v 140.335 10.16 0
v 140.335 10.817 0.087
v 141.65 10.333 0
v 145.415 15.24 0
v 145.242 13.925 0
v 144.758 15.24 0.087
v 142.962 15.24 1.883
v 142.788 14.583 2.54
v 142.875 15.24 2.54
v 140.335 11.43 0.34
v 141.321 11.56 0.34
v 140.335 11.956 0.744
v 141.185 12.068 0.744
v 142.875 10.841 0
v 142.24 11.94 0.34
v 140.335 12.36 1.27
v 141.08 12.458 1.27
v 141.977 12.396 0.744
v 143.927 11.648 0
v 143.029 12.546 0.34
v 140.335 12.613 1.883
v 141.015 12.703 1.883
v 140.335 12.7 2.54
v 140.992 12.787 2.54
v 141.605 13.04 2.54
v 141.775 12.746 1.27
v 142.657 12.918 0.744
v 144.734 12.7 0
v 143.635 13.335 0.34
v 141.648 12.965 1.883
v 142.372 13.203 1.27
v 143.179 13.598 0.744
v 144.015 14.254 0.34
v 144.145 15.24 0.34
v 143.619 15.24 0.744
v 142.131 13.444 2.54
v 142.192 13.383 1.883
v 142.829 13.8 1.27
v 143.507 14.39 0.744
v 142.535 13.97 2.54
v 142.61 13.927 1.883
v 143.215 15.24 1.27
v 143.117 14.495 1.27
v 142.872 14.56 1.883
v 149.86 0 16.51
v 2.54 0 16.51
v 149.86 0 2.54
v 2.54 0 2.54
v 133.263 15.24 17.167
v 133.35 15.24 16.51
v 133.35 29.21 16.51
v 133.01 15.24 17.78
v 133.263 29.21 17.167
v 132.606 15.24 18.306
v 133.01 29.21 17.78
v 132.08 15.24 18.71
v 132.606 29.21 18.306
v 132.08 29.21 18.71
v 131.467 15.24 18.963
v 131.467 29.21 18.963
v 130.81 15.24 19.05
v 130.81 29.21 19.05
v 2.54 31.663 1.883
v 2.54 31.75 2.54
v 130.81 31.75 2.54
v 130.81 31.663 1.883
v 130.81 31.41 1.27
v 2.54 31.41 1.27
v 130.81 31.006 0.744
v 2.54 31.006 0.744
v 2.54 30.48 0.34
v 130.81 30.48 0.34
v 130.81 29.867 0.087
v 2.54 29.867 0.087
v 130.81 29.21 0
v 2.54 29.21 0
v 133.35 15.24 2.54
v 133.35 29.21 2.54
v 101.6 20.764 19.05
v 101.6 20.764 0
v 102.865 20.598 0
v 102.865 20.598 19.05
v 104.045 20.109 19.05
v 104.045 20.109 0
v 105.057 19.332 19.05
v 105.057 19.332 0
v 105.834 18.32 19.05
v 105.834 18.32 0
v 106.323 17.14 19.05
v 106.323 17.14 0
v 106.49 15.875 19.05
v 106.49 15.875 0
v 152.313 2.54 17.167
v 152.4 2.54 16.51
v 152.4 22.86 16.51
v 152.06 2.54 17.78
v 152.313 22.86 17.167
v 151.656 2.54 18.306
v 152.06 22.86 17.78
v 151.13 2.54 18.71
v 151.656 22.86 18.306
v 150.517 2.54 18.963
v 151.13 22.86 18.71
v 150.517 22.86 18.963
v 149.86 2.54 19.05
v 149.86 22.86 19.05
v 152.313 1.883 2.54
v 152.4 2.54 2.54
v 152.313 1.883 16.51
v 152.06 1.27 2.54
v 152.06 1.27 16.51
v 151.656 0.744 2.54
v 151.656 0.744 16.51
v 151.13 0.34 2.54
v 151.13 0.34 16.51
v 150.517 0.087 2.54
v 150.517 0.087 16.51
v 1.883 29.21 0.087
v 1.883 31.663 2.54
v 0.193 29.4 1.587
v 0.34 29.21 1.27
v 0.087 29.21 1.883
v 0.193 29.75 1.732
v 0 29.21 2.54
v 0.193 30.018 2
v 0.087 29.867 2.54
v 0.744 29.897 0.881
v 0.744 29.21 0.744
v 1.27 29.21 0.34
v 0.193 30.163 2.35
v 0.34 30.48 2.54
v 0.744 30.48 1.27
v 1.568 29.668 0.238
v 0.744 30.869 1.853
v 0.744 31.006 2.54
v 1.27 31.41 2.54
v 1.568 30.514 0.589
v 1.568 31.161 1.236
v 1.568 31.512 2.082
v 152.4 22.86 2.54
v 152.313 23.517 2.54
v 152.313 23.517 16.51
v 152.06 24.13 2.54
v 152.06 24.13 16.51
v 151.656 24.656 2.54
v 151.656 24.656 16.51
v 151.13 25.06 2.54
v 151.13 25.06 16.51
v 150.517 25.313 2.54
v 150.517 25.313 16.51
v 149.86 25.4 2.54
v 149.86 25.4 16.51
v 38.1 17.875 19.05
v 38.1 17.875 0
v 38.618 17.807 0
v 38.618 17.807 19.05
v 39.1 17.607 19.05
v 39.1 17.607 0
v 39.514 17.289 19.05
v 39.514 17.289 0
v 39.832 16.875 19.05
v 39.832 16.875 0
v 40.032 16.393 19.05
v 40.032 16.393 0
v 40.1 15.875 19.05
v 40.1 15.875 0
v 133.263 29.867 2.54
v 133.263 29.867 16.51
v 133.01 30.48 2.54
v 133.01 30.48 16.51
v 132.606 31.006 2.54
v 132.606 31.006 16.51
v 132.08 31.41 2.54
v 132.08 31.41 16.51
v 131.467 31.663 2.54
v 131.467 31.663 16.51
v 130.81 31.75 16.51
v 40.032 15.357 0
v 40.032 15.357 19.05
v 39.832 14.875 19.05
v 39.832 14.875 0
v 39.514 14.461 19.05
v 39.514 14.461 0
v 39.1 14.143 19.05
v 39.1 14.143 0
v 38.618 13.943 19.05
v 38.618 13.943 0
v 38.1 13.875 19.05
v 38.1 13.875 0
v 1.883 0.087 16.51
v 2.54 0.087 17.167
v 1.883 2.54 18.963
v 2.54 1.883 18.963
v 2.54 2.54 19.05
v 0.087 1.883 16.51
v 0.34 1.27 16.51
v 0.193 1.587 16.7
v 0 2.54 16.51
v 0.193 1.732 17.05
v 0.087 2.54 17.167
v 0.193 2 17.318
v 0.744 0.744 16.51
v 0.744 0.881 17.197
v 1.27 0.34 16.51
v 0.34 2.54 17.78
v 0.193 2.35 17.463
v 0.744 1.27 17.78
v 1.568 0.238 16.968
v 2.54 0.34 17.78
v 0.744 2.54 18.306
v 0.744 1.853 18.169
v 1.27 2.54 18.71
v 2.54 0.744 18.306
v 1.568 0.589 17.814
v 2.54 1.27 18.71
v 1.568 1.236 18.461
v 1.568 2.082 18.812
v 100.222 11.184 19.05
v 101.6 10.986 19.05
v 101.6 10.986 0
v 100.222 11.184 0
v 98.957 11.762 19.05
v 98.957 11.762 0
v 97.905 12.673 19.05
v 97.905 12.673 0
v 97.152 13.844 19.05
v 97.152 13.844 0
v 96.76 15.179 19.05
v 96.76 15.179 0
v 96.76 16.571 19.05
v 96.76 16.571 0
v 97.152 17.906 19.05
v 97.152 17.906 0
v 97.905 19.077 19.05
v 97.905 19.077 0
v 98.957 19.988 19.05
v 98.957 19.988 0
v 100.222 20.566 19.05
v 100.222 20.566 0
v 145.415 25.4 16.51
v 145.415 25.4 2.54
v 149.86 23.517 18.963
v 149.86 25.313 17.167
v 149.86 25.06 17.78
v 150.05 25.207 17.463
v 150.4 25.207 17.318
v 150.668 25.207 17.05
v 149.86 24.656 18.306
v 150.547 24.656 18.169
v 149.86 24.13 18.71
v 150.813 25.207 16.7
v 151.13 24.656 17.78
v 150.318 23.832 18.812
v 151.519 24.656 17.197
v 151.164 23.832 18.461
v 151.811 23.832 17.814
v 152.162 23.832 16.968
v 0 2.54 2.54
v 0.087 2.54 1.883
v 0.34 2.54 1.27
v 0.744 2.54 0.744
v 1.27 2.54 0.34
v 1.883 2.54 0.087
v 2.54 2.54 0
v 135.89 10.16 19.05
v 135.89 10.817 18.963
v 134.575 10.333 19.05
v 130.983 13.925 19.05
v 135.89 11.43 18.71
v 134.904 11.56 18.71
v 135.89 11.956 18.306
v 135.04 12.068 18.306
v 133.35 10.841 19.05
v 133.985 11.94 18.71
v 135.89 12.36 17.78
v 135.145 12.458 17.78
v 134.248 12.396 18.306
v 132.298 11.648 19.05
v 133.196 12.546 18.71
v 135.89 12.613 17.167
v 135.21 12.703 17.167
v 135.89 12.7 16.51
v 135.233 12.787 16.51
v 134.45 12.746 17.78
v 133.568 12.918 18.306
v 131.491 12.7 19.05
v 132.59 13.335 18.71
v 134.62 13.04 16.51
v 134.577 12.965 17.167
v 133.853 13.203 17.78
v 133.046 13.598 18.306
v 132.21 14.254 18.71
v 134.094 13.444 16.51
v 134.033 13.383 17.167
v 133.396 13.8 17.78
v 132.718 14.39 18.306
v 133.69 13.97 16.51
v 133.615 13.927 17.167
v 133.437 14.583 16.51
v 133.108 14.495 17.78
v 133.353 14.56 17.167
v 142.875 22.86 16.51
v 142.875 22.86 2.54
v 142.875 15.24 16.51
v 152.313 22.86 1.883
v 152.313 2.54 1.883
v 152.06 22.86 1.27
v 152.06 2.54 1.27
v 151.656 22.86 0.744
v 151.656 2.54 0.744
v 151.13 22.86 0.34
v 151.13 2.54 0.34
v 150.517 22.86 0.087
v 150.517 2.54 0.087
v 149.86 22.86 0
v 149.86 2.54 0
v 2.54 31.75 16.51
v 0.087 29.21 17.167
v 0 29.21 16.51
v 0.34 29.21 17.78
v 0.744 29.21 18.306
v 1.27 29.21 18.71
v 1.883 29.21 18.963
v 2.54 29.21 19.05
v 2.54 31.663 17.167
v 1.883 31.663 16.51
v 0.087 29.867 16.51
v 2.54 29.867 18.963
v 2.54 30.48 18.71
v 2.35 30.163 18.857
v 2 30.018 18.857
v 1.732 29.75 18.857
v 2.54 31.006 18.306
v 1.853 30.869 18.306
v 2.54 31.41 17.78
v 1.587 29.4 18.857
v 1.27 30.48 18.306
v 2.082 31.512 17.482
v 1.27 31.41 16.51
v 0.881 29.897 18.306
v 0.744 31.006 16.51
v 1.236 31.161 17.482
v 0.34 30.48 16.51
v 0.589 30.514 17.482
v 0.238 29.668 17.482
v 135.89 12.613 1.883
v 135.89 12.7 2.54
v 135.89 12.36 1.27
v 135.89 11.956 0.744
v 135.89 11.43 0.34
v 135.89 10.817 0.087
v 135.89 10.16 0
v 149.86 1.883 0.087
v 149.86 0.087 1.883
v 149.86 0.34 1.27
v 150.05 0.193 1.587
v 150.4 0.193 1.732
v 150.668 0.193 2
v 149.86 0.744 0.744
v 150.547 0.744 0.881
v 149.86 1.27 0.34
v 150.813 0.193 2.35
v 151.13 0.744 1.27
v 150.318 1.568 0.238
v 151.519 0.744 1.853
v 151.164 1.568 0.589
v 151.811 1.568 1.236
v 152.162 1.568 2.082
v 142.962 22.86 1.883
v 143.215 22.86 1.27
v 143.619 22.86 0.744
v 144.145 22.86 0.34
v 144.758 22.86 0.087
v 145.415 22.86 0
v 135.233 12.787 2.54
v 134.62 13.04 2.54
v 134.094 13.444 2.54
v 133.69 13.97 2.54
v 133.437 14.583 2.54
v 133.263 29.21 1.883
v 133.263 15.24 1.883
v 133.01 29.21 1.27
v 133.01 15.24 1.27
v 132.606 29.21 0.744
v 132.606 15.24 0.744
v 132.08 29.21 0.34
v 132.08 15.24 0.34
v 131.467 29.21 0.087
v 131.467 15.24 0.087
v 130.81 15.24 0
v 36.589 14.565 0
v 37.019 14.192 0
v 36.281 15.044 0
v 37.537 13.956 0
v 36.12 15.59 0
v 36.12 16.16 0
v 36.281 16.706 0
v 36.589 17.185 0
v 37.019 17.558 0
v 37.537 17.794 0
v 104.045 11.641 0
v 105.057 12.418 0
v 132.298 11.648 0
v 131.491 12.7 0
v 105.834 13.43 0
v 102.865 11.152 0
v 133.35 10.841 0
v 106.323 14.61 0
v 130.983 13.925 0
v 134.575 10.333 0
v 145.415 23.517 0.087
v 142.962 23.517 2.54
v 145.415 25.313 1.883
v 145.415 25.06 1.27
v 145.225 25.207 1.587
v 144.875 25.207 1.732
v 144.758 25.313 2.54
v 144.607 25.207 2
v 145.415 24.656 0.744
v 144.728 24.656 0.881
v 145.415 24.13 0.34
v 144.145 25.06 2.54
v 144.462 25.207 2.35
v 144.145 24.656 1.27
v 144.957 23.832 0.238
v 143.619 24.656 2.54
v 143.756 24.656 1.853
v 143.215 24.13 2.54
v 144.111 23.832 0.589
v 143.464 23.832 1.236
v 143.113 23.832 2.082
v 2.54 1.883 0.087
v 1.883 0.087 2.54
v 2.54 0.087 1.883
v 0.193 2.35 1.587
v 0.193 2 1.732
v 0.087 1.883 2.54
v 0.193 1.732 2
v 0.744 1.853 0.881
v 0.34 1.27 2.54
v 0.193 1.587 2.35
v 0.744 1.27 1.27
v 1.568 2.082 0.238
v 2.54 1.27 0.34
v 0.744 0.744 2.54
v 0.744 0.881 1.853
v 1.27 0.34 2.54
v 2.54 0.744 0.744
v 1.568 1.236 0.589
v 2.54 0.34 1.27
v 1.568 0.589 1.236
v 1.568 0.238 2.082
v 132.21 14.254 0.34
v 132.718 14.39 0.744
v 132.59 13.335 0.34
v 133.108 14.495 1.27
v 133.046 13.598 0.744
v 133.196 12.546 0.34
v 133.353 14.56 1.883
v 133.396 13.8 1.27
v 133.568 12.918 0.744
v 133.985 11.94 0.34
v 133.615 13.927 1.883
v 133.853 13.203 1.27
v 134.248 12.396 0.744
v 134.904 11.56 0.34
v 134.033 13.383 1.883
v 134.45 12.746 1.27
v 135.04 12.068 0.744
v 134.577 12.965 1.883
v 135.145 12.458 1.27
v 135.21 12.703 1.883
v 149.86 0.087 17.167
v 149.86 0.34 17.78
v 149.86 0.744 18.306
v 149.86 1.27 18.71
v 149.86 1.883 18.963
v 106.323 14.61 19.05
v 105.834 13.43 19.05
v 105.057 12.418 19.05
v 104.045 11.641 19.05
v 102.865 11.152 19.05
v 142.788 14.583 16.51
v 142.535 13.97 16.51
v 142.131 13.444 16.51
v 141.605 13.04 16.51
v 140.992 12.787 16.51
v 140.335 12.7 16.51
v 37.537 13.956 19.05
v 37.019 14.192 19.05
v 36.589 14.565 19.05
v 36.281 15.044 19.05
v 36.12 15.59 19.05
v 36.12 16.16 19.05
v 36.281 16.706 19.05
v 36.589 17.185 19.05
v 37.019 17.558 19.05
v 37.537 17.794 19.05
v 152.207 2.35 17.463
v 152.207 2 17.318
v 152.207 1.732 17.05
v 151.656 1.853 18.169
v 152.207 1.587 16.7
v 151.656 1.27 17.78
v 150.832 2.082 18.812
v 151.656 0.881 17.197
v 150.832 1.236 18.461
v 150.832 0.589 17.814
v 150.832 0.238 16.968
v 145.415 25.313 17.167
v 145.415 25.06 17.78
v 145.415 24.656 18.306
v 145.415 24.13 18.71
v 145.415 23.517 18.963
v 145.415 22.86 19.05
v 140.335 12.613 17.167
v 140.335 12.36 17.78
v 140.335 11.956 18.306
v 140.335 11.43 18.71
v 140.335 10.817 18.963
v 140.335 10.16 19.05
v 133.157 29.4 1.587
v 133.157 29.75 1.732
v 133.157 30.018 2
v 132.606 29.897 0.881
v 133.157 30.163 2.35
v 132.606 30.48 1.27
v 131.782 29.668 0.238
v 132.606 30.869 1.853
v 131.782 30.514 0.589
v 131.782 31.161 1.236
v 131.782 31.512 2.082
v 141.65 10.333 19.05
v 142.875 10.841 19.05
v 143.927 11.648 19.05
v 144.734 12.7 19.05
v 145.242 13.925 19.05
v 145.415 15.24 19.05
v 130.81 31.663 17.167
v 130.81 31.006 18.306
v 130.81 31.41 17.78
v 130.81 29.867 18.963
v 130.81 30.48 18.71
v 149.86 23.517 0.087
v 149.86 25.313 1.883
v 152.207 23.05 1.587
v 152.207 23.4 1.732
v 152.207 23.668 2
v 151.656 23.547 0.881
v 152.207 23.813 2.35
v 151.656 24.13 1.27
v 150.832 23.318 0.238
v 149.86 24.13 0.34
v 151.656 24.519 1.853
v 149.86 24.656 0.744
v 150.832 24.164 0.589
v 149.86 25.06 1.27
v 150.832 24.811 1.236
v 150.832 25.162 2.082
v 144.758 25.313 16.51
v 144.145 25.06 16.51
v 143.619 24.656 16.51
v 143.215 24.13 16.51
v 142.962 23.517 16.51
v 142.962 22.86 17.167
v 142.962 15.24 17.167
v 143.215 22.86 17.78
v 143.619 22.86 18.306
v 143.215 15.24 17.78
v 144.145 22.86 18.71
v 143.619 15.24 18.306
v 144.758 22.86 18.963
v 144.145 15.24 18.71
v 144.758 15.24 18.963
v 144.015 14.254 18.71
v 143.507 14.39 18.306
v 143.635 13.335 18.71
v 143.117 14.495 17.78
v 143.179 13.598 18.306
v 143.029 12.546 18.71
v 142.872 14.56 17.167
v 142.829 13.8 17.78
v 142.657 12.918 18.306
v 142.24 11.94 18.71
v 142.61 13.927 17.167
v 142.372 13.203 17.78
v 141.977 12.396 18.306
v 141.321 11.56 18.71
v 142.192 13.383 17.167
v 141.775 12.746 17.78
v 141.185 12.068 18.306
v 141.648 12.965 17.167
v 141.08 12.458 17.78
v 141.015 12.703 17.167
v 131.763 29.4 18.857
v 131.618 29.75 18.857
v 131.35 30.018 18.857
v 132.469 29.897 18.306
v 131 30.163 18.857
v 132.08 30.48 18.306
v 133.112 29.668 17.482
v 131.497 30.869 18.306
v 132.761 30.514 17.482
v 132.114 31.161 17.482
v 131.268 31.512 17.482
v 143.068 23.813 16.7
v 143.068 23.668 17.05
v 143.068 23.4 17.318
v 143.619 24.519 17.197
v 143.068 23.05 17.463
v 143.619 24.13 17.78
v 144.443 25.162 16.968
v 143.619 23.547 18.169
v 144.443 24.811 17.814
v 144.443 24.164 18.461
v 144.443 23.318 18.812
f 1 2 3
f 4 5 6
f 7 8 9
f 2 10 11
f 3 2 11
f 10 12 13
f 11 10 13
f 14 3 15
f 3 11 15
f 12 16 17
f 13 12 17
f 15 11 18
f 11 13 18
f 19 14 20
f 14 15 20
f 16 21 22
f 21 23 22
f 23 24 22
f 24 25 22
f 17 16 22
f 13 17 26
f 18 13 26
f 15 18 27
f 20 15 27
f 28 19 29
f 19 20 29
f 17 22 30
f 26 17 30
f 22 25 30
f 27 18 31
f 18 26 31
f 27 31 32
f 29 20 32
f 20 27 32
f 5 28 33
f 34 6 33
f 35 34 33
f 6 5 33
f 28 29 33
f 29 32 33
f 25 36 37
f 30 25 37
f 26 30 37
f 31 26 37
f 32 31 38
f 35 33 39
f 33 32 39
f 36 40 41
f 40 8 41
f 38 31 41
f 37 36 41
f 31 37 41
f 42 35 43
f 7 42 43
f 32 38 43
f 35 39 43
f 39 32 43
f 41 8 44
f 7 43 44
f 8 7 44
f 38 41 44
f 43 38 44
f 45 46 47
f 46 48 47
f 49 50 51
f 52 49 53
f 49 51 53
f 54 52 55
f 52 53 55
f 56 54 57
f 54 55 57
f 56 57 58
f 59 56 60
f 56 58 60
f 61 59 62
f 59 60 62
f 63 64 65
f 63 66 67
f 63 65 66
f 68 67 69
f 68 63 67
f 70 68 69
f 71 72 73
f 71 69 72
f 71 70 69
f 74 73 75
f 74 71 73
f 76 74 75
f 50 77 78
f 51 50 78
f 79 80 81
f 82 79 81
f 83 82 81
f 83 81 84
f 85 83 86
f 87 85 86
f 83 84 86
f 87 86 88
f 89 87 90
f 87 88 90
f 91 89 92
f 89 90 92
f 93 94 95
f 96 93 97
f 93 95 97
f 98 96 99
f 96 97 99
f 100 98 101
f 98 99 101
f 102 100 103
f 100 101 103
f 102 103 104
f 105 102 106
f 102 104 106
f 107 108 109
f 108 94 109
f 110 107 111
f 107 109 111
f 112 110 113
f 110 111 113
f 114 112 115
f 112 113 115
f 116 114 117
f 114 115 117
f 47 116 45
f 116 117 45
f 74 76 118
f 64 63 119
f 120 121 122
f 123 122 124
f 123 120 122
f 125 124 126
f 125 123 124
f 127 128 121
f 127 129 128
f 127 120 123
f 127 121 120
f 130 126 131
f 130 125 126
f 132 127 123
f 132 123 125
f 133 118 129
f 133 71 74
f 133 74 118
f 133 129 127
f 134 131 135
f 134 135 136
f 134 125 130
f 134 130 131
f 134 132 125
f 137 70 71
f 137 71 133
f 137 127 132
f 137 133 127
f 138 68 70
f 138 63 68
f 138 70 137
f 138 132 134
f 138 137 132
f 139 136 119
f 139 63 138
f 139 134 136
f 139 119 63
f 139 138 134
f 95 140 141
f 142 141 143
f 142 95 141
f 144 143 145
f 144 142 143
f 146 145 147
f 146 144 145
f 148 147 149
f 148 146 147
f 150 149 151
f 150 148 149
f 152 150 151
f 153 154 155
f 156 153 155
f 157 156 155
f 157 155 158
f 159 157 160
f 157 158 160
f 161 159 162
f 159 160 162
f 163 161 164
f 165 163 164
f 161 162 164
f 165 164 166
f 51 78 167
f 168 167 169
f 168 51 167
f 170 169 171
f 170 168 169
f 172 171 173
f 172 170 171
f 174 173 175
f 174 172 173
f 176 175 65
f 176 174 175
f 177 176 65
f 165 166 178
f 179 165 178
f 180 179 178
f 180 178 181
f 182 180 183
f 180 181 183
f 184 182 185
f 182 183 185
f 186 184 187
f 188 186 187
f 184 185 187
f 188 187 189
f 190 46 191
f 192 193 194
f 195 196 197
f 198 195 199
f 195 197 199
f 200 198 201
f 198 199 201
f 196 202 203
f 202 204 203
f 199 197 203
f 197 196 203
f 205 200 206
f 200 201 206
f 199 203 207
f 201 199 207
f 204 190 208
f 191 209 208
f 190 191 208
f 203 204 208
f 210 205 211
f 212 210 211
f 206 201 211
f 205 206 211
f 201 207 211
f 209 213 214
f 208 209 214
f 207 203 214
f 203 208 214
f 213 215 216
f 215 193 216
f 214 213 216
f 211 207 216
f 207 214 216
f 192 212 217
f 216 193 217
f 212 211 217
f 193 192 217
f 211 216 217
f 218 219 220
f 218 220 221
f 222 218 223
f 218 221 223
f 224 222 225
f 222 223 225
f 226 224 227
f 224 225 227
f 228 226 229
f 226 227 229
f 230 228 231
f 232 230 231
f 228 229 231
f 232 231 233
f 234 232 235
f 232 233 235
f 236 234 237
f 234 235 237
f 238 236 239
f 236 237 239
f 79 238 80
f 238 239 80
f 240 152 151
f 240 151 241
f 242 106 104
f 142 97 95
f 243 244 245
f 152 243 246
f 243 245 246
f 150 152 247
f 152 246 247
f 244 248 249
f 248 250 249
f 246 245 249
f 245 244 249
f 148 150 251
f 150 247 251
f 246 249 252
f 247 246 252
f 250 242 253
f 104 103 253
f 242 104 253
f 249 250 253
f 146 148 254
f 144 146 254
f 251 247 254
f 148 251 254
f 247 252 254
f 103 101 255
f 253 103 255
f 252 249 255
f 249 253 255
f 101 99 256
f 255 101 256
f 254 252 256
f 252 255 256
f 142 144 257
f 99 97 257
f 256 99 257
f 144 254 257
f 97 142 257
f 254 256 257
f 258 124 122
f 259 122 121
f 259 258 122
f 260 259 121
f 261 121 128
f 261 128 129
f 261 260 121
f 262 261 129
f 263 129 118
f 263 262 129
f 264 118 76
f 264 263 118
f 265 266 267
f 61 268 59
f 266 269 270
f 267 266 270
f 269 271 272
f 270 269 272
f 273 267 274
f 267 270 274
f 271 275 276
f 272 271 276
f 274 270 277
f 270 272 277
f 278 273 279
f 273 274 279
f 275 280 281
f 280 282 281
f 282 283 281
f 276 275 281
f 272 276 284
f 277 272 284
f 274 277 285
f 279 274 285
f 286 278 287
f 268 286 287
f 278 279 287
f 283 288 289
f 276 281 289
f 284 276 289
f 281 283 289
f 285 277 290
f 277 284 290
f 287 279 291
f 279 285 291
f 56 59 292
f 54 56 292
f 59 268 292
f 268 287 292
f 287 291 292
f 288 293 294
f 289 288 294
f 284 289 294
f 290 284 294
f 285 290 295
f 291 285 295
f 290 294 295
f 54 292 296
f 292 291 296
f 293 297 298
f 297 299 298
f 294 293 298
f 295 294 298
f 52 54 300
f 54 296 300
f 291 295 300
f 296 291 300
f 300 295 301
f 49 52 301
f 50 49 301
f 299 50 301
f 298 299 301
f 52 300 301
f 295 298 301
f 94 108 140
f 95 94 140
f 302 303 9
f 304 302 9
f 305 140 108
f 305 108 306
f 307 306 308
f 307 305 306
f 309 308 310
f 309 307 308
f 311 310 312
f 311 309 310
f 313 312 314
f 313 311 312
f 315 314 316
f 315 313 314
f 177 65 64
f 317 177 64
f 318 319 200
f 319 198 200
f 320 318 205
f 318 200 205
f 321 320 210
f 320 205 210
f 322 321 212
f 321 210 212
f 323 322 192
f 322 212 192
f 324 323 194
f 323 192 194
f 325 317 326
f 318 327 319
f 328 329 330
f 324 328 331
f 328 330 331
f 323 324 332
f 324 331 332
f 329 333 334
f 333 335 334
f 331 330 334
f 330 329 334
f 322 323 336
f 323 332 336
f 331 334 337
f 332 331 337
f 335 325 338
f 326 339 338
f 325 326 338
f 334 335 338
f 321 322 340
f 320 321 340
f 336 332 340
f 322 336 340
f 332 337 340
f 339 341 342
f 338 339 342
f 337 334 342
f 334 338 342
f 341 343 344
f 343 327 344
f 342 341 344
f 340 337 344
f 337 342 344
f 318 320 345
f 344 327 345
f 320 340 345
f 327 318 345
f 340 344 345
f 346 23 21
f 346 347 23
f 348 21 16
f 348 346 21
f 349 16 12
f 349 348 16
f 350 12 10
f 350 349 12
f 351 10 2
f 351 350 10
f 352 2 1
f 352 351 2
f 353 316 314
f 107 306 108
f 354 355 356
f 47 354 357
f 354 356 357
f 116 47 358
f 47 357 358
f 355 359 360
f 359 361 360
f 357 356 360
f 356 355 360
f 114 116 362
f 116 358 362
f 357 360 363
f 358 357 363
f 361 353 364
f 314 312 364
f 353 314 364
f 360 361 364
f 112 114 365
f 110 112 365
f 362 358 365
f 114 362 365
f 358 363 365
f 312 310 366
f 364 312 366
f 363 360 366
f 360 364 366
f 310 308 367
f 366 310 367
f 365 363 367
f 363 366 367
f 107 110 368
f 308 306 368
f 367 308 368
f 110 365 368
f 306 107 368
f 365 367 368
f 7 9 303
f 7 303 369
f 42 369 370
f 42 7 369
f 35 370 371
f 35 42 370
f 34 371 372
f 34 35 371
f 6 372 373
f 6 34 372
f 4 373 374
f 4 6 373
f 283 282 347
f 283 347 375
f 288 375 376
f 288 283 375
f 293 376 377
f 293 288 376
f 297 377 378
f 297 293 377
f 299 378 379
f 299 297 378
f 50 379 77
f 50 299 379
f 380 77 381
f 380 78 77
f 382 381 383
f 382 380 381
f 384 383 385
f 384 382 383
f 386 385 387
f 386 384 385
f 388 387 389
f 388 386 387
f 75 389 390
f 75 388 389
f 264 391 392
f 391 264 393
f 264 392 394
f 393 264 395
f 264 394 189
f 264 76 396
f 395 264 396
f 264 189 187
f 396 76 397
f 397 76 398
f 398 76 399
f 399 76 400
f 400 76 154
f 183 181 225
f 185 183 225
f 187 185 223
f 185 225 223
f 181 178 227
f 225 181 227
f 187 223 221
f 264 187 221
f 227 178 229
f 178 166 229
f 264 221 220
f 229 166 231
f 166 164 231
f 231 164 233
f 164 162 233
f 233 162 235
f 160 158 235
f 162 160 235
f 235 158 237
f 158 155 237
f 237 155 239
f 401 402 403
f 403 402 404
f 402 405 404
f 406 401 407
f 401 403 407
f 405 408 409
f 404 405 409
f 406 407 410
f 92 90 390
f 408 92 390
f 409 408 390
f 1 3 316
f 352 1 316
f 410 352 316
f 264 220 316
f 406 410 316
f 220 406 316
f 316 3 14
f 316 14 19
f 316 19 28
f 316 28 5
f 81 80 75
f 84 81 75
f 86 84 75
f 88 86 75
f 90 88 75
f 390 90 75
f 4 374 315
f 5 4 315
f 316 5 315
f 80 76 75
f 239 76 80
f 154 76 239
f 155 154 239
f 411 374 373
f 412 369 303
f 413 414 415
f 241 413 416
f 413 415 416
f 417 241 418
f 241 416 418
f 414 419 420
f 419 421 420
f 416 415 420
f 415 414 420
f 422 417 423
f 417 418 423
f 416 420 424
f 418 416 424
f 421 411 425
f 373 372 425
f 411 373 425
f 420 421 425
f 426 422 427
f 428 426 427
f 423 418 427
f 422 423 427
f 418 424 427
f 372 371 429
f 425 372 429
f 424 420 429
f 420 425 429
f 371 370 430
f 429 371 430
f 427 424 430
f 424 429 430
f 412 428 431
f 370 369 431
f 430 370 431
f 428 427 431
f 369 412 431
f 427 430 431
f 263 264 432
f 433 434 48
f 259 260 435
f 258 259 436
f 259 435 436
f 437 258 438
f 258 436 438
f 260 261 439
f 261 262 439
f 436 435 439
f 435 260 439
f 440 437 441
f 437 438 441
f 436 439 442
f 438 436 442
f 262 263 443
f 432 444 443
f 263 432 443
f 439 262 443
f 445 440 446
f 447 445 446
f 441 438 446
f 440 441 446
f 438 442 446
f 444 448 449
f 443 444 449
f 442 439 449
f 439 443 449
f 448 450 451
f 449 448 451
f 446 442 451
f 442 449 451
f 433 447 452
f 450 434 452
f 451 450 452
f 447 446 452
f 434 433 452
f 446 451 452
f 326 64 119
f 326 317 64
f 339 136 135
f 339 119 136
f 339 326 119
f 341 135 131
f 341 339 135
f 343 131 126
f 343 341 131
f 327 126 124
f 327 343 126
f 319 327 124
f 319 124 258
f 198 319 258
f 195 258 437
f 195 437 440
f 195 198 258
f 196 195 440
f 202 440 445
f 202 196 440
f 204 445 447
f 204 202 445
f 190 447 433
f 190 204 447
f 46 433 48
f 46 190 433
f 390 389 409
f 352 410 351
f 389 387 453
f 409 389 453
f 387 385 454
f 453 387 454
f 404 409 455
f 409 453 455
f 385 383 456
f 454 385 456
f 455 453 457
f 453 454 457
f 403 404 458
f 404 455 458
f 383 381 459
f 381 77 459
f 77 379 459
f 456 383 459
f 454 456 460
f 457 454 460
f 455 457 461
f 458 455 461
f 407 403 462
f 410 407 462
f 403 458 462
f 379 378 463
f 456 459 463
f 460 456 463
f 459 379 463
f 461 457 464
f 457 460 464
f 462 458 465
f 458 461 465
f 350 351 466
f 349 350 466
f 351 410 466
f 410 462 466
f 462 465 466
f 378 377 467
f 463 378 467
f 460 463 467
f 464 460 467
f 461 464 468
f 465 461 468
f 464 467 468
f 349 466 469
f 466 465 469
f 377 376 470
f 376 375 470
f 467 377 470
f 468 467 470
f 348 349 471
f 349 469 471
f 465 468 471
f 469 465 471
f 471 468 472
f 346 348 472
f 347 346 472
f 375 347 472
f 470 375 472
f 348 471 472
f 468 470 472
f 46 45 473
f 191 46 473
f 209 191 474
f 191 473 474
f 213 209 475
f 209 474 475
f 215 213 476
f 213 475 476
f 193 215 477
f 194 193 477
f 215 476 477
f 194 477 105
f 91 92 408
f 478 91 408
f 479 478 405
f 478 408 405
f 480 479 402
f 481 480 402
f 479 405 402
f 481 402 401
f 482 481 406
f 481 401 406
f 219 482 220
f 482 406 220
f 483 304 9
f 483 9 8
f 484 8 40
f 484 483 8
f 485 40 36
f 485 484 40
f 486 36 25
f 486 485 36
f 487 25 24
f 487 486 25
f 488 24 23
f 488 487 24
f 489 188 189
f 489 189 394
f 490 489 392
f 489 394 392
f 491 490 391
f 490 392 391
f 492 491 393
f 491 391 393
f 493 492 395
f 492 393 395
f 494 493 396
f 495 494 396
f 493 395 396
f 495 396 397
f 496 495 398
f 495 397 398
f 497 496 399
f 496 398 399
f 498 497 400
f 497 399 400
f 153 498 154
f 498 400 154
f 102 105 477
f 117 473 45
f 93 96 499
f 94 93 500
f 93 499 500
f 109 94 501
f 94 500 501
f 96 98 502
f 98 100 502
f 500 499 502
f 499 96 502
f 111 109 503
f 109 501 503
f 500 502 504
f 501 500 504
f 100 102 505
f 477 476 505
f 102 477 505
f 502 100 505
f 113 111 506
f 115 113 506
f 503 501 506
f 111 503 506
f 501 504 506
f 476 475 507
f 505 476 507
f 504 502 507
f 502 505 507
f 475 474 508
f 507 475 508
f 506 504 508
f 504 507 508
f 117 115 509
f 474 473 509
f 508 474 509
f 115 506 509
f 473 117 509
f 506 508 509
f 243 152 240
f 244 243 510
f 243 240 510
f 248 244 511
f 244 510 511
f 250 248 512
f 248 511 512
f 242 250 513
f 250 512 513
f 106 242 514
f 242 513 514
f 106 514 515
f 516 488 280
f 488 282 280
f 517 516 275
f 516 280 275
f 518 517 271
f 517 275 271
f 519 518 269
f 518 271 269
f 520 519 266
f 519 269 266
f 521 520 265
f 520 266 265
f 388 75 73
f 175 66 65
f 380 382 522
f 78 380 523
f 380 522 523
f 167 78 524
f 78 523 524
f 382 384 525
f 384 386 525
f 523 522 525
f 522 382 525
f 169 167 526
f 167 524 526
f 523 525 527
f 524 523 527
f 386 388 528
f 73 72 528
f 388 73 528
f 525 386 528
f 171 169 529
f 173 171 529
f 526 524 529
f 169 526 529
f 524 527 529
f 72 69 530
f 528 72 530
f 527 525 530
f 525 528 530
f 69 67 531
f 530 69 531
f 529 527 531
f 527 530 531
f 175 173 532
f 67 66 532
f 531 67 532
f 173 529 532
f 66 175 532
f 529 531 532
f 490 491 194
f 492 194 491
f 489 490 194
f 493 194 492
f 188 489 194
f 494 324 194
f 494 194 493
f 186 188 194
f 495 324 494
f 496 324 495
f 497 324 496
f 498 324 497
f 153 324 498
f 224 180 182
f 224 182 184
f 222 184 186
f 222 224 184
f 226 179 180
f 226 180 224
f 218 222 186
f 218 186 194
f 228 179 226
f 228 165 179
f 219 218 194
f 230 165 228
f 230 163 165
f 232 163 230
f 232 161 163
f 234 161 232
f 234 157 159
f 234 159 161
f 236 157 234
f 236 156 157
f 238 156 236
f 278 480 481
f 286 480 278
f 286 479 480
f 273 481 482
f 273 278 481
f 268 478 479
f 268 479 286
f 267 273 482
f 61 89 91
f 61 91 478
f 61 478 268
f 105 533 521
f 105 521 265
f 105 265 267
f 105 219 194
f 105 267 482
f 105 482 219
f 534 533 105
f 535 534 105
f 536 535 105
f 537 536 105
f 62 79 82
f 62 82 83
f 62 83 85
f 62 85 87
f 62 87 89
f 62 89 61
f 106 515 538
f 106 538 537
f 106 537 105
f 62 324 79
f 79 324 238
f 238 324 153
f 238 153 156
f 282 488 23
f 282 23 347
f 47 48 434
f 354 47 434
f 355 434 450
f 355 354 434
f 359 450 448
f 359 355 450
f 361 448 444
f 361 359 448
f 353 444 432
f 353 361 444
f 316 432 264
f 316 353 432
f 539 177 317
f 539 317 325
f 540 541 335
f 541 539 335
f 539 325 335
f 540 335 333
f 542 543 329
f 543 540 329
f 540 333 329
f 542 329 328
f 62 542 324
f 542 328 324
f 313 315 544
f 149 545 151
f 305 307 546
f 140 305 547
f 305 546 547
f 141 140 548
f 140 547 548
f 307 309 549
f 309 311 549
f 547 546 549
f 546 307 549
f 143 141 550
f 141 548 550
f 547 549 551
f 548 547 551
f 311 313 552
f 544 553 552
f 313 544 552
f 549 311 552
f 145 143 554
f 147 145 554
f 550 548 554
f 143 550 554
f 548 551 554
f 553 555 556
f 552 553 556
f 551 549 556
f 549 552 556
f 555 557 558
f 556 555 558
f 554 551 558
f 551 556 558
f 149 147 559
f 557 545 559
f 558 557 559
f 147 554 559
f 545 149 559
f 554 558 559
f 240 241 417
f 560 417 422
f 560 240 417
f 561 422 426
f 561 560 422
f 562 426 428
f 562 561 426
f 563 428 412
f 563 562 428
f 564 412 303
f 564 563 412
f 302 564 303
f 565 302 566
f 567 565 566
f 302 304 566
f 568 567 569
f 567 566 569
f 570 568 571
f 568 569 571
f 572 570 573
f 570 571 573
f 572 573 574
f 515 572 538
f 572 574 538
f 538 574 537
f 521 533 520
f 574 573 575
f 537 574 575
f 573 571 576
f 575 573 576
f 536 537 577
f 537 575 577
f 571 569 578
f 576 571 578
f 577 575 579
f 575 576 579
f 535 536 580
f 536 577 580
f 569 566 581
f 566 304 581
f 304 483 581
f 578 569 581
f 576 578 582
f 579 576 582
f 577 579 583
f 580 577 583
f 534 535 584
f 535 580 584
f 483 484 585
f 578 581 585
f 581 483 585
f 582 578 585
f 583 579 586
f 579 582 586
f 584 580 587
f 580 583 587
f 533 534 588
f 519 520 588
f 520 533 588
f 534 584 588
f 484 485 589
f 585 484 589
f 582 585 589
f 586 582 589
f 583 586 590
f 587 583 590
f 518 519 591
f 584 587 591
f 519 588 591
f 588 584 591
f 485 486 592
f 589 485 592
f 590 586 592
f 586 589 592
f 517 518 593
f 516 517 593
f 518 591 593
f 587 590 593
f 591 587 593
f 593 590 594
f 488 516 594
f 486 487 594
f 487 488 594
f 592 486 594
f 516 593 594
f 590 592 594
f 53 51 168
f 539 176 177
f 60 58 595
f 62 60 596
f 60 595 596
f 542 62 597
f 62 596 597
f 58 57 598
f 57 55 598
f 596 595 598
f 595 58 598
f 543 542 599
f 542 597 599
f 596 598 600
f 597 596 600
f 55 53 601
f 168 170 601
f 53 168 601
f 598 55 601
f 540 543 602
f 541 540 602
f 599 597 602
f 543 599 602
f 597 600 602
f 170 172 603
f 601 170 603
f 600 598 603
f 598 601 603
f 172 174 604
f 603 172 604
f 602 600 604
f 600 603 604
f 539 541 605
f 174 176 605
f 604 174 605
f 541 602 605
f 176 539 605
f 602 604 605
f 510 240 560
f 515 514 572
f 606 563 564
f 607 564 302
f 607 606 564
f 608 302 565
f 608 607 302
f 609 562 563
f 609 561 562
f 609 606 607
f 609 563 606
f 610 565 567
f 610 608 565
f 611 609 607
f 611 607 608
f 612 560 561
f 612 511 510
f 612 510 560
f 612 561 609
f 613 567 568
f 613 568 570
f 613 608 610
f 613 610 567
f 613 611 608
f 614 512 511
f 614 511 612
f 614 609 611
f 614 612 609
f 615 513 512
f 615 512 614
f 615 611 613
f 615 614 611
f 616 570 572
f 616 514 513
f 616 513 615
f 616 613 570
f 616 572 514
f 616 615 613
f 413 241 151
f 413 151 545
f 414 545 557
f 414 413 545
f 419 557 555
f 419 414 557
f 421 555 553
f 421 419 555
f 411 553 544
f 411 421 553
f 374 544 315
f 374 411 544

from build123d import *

# Parameters (mm, degrees)
BOSS_EXTRUDE1_DEPTH = 19.05
FILLET2_R           = 2.54


with BuildPart() as part:
    # Sketch1 → Boss-Extrude1 (new body)
    with BuildSketch(Plane.XY):
        with BuildLine():
            ThreePointArc((101.6, 10.9855), (96.7105, 15.875), (101.6, 20.7645))
            Line((101.6, 20.7645), (101.6, 31.75))
            Line((101.6, 31.75), (38.1, 31.75))
            Line((38.1, 31.75), (38.1, 17.875))
            ThreePointArc((38.1, 17.875), (39.514213562, 17.289213562), (40.1, 15.875))
            ThreePointArc((40.1, 15.875), (39.514213562, 14.460786438), (38.1, 13.875))
            Line((38.1, 13.875), (38.1, 0))
            Line((38.1, 0), (101.6, 0))
            Line((101.6, 0), (101.6, 10.9855))
        make_face()
        with BuildLine():
            Line((101.6, 31.75), (101.6, 20.7645))
            ThreePointArc((101.6, 20.7645), (105.057398607, 19.332398607), (106.4895, 15.875))
            ThreePointArc((106.4895, 15.875), (105.057398607, 12.417601393), (101.6, 10.9855))
            Line((101.6, 10.9855), (101.6, 0))
            Line((101.6, 0), (152.4, 0))
            Line((152.4, 0), (152.4, 25.4))
            Line((152.4, 25.4), (142.875, 25.4))
            Line((142.875, 25.4), (142.875, 12.7))
            Line((142.875, 12.7), (133.35, 12.7))
            Line((133.35, 12.7), (133.35, 31.75))
            Line((133.35, 31.75), (101.6, 31.75))
        make_face()
        with BuildLine():
            Line((38.1, 17.875), (38.1, 31.75))
            Line((38.1, 31.75), (0, 31.75))
            Line((0, 31.75), (0, 0))
            Line((0, 0), (38.1, 0))
            Line((38.1, 0), (38.1, 13.875))
            ThreePointArc((38.1, 13.875), (36.1, 15.875), (38.1, 17.875))
        make_face()
    extrude(amount=BOSS_EXTRUDE1_DEPTH)

    # Fillet2
    fillet2_edges = [part.edges().sort_by_distance(p)[0] for p in [
        (76.2, 0, 19.05),
        (66.675, 31.75, 0),
        (133.35, 22.225, 0),
        (138.1125, 12.7, 0),
        (142.875, 19.05, 0),
        (147.6375, 25.4, 0),
        (152.4, 12.7, 0),
        (152.4, 12.7, 19.05),
        (76.2, 0, 0),
        (0, 15.875, 0),
        (147.6375, 25.4, 19.05),
        (0, 31.75, 9.525),
        (133.35, 31.75, 9.525),
        (133.35, 12.7, 9.525),
        (142.875, 12.7, 9.525),
        (142.875, 25.4, 9.525),
        (152.4, 25.4, 9.525),
        (152.4, 0, 9.525),
        (0, 0, 9.525),
        (142.875, 19.05, 19.05),
        (138.1125, 12.7, 19.05),
        (133.35, 22.225, 19.05),
        (66.675, 31.75, 19.05),
        (0, 15.875, 19.05),
    ]]
    fillet(fillet2_edges, radius=FILLET2_R)


solid = part.part
